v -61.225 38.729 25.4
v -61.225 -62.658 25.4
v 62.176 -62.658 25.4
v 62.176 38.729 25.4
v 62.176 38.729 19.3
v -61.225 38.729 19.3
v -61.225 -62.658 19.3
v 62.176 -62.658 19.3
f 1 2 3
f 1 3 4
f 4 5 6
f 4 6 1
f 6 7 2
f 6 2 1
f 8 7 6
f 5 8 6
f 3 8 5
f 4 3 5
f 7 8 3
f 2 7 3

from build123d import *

# Parameters (mm, degrees)
F0_W     = 122.1274062991
F0_H     = 126.3863071799
F1_DEPTH = 25.4
F2_DEPTH = 25
F3_DEPTH = 23.727
F4_DEPTH = 25
F5_DEPTH = 19.3


with BuildPart() as f1:
    # F0 (on Top) → F1 (new body)
    with BuildSketch(Plane.XY):
        with Locations((-0.1608096063, 0.5355887115)):
            Rectangle(F0_W, F0_H)
    extrude(amount=F1_DEPTH)

    # F2 (add): a face of the model
    f2_faces = [f1.faces().sort_by_distance(p)[0] for p in [
        (60.9028935432, 0.5355887115, 12.7),
    ]]
    extrude(f2_faces, amount=F2_DEPTH)

    # F3 (cut): a face of the model
    f3_faces = [f1.faces().sort_by_distance(p)[0] for p in [
        (85.9028935432, 0.5355887115, 12.7),
    ]]
    extrude(f3_faces, amount=-F3_DEPTH, mode=Mode.SUBTRACT)

    # F4 (cut): a face of the model
    f4_faces = [f1.faces().sort_by_distance(p)[0] for p in [
        (0.4756903937, 63.7287423015, 12.7),
    ]]
    extrude(f4_faces, amount=-F4_DEPTH, mode=Mode.SUBTRACT)

    # F5 (cut): a face of the model
    f5_faces = [f1.faces().sort_by_distance(p)[0] for p in [
        (0.4756903937, -11.9644112885, 0),
    ]]
    extrude(f5_faces, amount=-F5_DEPTH, mode=Mode.SUBTRACT)


solid = f1.part
